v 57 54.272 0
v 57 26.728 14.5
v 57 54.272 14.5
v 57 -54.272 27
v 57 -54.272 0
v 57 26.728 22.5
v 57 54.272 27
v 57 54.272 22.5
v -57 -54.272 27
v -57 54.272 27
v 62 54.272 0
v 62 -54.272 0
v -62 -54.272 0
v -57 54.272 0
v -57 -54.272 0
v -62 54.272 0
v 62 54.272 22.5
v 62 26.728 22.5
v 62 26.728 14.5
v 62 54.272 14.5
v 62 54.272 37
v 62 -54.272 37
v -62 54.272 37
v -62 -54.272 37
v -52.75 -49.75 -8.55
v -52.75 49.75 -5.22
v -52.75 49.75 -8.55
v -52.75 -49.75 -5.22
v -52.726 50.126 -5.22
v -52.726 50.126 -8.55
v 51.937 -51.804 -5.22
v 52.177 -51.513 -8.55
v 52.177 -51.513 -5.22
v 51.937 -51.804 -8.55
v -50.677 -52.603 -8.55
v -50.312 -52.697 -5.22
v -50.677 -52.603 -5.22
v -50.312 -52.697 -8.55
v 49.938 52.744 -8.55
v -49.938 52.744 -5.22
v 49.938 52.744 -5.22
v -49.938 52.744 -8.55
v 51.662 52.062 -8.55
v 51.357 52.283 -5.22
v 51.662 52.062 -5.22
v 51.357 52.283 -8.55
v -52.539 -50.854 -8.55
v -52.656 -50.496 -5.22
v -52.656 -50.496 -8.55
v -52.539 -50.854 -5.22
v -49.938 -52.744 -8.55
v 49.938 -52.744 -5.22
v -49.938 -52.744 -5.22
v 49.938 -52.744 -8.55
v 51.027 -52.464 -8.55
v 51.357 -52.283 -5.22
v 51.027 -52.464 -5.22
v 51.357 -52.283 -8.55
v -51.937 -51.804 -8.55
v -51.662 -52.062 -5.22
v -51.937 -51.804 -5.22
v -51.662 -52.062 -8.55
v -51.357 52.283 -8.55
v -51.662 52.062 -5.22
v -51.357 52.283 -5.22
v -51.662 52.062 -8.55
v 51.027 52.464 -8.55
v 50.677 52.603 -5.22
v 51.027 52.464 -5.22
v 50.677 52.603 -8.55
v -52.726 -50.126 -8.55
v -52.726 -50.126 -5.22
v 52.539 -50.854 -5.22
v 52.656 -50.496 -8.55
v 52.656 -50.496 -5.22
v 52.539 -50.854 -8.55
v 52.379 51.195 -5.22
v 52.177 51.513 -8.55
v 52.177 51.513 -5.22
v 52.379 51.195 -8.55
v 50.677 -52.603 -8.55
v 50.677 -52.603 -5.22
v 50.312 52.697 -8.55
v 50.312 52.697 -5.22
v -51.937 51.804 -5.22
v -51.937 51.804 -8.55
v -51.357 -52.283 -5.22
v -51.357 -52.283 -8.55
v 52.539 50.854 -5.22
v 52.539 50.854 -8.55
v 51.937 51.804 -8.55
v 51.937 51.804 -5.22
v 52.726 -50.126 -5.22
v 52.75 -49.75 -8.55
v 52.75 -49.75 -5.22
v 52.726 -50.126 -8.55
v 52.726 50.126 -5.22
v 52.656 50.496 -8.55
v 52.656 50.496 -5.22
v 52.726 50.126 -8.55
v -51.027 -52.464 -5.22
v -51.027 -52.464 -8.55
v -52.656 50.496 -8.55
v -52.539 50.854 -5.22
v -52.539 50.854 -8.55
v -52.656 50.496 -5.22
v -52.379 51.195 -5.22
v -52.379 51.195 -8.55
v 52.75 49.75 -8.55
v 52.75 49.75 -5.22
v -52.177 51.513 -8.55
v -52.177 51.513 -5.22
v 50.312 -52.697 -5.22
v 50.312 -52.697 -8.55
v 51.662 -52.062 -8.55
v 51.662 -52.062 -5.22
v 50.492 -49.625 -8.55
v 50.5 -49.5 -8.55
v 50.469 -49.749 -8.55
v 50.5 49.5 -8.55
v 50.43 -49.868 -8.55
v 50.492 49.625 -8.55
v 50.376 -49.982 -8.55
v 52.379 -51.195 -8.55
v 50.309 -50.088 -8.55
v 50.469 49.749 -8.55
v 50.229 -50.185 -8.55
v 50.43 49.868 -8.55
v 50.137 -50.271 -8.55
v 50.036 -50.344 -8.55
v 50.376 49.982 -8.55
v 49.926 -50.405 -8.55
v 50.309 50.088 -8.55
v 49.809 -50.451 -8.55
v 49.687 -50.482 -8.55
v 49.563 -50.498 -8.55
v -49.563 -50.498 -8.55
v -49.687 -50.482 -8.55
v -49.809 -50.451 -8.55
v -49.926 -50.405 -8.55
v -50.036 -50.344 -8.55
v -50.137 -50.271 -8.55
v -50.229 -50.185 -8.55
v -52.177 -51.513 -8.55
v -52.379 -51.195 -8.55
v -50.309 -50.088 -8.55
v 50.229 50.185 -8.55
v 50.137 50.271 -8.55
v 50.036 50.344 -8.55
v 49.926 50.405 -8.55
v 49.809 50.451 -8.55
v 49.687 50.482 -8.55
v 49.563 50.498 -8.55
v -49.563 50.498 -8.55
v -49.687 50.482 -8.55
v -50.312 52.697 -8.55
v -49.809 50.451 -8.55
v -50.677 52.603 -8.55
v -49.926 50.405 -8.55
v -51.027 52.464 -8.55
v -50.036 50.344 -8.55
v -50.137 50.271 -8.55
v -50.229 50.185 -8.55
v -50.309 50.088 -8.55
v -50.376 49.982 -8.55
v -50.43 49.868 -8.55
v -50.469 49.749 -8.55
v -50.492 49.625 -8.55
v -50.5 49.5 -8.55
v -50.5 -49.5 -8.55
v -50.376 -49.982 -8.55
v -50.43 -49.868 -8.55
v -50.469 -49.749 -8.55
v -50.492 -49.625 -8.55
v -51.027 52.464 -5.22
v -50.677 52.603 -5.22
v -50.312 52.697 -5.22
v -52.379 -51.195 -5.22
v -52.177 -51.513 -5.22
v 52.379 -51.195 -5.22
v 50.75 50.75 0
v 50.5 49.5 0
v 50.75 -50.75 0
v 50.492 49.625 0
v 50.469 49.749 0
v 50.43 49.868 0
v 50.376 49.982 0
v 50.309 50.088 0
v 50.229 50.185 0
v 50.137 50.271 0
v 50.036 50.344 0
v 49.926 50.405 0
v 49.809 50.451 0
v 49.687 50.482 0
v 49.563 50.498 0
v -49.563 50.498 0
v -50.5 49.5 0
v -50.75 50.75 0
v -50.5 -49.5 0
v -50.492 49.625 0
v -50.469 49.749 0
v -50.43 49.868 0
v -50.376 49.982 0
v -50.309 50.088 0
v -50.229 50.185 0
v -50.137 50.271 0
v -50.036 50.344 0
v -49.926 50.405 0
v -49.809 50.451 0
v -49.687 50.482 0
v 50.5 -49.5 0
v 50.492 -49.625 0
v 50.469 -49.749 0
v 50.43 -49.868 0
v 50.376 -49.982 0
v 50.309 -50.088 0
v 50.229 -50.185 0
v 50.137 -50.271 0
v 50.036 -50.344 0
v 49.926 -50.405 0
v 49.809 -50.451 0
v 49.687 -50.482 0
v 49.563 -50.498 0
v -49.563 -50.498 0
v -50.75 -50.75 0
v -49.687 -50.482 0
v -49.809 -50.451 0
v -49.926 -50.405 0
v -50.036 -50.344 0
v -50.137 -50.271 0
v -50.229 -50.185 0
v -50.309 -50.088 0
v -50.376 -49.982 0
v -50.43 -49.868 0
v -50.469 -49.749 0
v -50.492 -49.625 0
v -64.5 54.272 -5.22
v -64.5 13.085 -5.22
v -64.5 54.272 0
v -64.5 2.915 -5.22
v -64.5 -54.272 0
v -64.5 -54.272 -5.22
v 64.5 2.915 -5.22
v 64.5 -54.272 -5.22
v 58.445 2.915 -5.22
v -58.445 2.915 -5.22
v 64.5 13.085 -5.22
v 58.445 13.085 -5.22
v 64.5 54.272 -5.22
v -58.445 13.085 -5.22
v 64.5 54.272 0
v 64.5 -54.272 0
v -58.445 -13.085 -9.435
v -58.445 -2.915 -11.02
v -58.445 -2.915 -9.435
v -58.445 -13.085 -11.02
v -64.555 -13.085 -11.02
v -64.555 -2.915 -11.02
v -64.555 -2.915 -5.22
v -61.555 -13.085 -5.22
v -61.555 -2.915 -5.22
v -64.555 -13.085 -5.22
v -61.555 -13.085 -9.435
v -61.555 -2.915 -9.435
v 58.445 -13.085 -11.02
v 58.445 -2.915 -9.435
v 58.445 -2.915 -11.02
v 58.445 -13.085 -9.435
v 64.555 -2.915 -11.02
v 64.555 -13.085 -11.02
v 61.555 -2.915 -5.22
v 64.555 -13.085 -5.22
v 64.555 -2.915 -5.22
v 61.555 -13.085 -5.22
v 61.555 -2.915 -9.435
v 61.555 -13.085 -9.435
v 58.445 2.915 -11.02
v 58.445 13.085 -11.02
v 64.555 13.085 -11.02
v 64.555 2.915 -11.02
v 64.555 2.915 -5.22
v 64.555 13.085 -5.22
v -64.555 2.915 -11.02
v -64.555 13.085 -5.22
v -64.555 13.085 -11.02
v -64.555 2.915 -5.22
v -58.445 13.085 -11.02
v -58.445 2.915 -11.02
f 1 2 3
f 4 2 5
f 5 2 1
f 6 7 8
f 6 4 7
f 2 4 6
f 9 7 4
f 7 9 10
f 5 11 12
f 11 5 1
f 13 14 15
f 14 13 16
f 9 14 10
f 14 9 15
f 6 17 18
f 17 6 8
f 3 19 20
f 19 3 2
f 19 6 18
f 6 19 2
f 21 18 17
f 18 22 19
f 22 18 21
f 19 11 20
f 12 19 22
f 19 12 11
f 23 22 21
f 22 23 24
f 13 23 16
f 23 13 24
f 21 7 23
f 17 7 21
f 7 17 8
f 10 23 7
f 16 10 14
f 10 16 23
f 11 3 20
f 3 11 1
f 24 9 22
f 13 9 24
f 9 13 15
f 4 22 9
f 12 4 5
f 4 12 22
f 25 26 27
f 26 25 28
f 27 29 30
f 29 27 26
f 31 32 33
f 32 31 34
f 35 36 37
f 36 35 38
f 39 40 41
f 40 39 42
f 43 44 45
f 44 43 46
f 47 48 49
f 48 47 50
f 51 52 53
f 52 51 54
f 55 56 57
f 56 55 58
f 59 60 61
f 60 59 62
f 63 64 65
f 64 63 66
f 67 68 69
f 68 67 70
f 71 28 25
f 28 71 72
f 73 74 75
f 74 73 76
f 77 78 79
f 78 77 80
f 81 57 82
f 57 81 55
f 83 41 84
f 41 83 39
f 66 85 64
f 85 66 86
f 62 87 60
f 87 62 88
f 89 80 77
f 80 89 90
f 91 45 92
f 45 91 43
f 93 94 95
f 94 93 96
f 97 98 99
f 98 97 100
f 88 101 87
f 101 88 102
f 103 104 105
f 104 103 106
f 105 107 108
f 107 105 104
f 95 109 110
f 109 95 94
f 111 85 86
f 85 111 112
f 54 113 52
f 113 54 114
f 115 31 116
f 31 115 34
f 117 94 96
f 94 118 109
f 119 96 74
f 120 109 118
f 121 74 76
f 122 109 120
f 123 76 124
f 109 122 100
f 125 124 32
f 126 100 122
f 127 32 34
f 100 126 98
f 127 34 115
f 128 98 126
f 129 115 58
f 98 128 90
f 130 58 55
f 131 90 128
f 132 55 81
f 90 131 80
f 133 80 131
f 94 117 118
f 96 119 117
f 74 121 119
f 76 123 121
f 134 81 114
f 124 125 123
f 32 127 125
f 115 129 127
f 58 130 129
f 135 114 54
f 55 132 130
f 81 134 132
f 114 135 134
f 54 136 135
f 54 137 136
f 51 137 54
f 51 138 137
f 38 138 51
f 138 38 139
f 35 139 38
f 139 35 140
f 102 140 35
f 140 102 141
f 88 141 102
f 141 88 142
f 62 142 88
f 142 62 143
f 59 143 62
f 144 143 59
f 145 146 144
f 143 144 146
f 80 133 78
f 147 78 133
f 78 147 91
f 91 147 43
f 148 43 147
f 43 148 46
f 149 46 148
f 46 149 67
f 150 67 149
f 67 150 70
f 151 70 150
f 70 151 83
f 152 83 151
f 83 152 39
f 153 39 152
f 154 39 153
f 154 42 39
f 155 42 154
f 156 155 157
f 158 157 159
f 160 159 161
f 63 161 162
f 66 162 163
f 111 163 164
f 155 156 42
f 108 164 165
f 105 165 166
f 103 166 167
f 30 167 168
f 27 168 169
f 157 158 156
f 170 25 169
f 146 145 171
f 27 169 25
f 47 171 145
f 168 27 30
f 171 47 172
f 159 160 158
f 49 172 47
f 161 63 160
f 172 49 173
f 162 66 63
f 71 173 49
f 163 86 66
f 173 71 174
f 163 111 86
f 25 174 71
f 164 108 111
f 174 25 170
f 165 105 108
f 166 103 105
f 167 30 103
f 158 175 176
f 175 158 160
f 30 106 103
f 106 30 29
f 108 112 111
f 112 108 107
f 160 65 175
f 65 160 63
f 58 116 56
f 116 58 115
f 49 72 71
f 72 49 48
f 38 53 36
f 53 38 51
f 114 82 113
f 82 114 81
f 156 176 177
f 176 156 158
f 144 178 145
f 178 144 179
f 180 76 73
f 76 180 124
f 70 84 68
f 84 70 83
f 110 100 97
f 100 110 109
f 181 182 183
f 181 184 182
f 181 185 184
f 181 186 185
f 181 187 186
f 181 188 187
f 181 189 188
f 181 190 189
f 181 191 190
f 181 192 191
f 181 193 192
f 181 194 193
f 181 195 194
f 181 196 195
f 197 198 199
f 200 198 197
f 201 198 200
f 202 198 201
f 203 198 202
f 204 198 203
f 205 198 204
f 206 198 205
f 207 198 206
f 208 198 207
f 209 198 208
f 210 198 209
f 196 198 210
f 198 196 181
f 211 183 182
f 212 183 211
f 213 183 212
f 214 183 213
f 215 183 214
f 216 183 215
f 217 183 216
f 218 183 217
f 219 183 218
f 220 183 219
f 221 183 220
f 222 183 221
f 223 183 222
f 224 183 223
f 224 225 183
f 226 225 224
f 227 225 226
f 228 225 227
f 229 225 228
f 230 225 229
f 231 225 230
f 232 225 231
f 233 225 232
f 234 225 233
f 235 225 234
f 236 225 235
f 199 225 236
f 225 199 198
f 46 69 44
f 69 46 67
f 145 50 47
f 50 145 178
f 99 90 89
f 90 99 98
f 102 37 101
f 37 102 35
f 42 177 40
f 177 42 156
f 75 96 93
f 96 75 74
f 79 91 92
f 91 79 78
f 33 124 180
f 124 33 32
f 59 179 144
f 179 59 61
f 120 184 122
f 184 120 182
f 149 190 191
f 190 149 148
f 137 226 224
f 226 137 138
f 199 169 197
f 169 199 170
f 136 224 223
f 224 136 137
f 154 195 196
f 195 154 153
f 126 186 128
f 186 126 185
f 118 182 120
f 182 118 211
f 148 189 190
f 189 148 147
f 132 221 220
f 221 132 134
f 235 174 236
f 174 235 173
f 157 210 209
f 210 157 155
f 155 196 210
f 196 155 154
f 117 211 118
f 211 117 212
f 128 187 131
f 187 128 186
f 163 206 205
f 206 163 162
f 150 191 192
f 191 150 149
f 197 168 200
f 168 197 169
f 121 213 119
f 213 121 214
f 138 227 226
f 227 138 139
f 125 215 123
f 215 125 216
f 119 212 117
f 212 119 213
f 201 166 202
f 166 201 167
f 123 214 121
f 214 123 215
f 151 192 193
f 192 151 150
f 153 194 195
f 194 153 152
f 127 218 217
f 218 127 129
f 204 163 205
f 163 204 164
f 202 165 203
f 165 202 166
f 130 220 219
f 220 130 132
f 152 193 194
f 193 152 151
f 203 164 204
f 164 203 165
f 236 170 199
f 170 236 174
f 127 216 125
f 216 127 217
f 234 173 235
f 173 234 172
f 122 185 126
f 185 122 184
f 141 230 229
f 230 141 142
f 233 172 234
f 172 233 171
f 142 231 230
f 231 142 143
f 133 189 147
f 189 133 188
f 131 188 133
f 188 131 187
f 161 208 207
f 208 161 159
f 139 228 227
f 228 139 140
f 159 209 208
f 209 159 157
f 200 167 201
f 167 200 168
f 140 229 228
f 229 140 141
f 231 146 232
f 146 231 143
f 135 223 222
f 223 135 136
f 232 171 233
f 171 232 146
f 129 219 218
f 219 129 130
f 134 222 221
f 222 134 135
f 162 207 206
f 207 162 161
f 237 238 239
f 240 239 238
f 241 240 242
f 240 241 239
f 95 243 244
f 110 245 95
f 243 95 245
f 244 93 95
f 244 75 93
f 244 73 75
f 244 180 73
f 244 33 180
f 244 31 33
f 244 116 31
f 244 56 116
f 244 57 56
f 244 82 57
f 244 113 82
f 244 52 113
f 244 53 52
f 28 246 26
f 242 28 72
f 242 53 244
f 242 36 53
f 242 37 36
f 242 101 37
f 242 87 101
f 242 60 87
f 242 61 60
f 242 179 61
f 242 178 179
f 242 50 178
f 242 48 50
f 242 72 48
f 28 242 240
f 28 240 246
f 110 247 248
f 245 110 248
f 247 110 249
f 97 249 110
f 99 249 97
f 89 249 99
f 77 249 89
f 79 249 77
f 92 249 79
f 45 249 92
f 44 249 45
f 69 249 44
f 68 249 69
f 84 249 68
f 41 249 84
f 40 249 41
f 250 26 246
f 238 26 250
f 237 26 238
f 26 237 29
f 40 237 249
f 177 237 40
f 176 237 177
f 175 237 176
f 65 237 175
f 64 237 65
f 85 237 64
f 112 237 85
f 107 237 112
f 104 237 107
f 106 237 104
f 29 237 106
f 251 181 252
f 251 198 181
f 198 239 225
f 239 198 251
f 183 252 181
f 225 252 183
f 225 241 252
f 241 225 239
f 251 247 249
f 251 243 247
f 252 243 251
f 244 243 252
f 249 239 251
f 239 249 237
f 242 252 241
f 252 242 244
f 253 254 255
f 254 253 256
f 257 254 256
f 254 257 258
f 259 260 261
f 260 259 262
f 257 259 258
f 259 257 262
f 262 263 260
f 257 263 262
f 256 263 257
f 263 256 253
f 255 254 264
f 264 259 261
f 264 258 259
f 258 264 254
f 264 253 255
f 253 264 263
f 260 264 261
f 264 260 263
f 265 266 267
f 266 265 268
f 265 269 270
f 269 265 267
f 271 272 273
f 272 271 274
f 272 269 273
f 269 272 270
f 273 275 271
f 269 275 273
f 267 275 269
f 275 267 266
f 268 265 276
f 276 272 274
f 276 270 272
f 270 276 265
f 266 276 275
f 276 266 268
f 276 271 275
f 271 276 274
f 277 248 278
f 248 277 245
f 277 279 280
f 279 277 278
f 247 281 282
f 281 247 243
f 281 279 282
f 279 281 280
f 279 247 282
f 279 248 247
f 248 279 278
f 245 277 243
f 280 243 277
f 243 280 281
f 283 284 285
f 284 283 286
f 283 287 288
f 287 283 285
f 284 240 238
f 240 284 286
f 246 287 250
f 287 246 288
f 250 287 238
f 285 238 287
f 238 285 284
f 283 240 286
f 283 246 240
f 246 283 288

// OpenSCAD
// file: lib/misc.scad
/*

Polaroid 600 / Polaroid 600se Adapter

This work is licensed under a Creative Commons Attribution-NonCommercial-ShareAlike 3.0 Unported License.

https://creativecommons.org/licenses/by-nc-sa/3.0/

-----------------------

Various parts


The nubs are stupid


*/

/* Nub dimensions [-------------------------------------------------------------- */

nub_depth = 34.19;
nub_width = 5.76;
nub_distance_from_seal = 2;
nub_distance_from_edge = 13.95;
nub_height_from_zero = 5.52;
nub_height = nub_height_from_zero - box_height;

/* Nub modules [-------------------------------------------------------------- */

module nub(nub_x, nub_y, nub_z) {
    
    translate([nub_x,nub_y,nub_z]){
        nub = [nub_width,nub_depth,nub_height];
                
        cube(nub,  center=true);
                
    }
}


module nubs() {
    nub_position1 = (outer_box_width/2-nub_width/2 - nub_distance_from_edge);
    nub_position2 = outer_box_depth/2-nub_depth/2;
    
    nub(nub_position1, nub_position2*-1, box_height);
    nub(nub_position1*-1, nub_position2, box_height);
    nub(nub_position1*-1, nub_position2*-1, box_height);
    nub(nub_position1, nub_position2, box_height);
    
}
// file: lib/claws.scad
/*

Polaroid 600 / Polaroid 600se Adapter

This work is licensed under a Creative Commons Attribution-NonCommercial-ShareAlike 3.0 Unported License.

https://creativecommons.org/licenses/by-nc-sa/3.0/

-----------------------

Claws to hook into the camera body. 

There are two claws and two dummy claws that don't hook. 

The claws hook into the body via the locking / unlocking mechanism on the 600se. 





*/


/* Claw dimensions [-------------------------------------------------------------- */

claw_height_from_zero = 11.02;

claw_width = 6.11; // measured at 5.11
claw_depth = 10.17;
claw_height= claw_height_from_zero-box_height;

claw_distance_from_seal = 5.23;
claw_distance_from_side = 41.90;
claw_distance_from_otherside = 56.00;

echo(outer_box_depth/2 - claw_distance_from_side);
echo(outer_box_depth/2 - claw_distance_from_otherside);

claw_y = 8; // I wish i could derive this. but here we are. 
//used to be (outer_box_depth/2 - claw_distance_from_side) + (outer_box_depth/2 - claw_distance_from_otherside);
//echo(claw_y);

claw_leg_width = 3.00;

claw_inside_height_from_zero = 9.45;
claw_inside_height = claw_inside_height_from_zero-box_height;
claw_inside_width= claw_width - claw_leg_width; // remainder is 3





/* Claw modules [-------------------------------------------------------------- */

module claw(x,y,z, orientation) {
    translate([x,y,z]){
        rotate(a=[0,0, orientation]) {
        difference() {
            claw = [claw_width,claw_depth,claw_height];
            cube(claw, center=true);

            color( "red", 1.0 ){
                translate([claw_leg_width/2,0,-.8]){
                    inside_claw = [claw_inside_width, claw_depth+3, claw_inside_height];
                    cube(inside_claw, center=true);
                }
            }
        } 
        }
    }

}

module dumb_claw(x,y,z, orientation) {
    translate([x,y,z]){
            claw = [claw_width,claw_depth,claw_height];
            cube(claw, center=true);
    }

}


module claw_old(x,y,z, orientation) {
    
    translate([x,y,z]){
        rotate(a=[0,0, orientation]) {
            difference() {
                claw_coords = [claw_width,claw_depth,claw_height+z-give ];
                cube(claw_coords, center=true);
                translate([0,-1.5,-.6]){
                    
                    claw = [claw_width,claw_depth-3,claw_height+z-give];
                    cube(claw, center=true);
                    
                }
            }
        }
    }
}


module claws() {
 
    claw_x = outer_box_width/2-11.5;
    //claw_y = 11 ; 
    height = claw_height/2 + box_height;

    claw(claw_x, -claw_y, height, -180);
    
    claw(-claw_x, -claw_y, height, 0);

    dumb_claw(-claw_x, claw_y, height, 0);
    dumb_claw(claw_x, claw_y, height, 0);
}
// file: lib/seal.scad
/*

Polaroid 600 / Polaroid 600se Adapter

This work is licensed under a Creative Commons Attribution-NonCommercial-ShareAlike 3.0 Unported License.

https://creativecommons.org/licenses/by-nc-sa/3.0/

-----------------------

Light seal

Seal to block the light

The light seal fits into the groove on the 600SE to block light once the back is installed. 


*/



/* Seal dimensions [-------------------------------------------------------------- */


seal_outer = 101;
seal_inner = 99.5;
seal_height = 7.55;
seal_wall_width = 2.11;

/* Seal Module [-------------------------------------------------------------- */


module seal() {
    // set it at 0
    translate([0,0,seal_height/2]){
    difference() {
        
        seal_box = [seal_outer,seal_outer,seal_height];
        //cube(seal_box, center=true);
        miniround(seal_box, 3, center=true);
        
       // inside of the seal
        inner_box = [seal_inner,seal_inner,seal_height];
        miniround(inner_box, 1, center=true);
        //cube(inner_box_lip, center=true);
        
    }
    }
}
// file: lib/base.scad
/*

Polaroid 600 / Polaroid 600se Adapter

This work is licensed under a Creative Commons Attribution-NonCommercial-ShareAlike 3.0 Unported License.

https://creativecommons.org/licenses/by-nc-sa/3.0/

-----------------------

Back Base

This is the generic base. I don't know why it is this big. 


*/


/* Base dimensions [-------------------------------------------------------------- */

outer_box_width= 146;
outer_box_depth = 108.545;
box_height = 5.22;

base_small_difference = 17;

/* Base module [-------------------------------------------------------------- */

// Base abstraction
module base_obj(x,y,z,seal_width) {
    // set it at 0
    translate([0,0,z/2]){
        difference() {
            // base
            outer_box = [x,y,z];
            cube(outer_box, center=true);
 
            // cut out the inside
            inner_box = [seal_width,seal_width,z];
            cube(inner_box,  center=true);
         }
     }   
}


//default base
module default_base() {
    base_obj(outer_box_width,outer_box_depth,box_height,seal_inner+2);
}

//default base
module small_base() {
    base_obj(outer_box_width-base_small_difference,outer_box_depth,box_height,seal_inner+2);
}
// file: lib/functions.scad
/*

Polaroid 600 / Polaroid 600se Adapter

This work is licensed under a Creative Commons Attribution-NonCommercial-ShareAlike 3.0 Unported License.

https://creativecommons.org/licenses/by-nc-sa/3.0/

-----------------------

Misc functions



*/


module miniround(size, radius, center=false)
{
	$fn=50;
	x = size[0]-radius/2;
	y = size[1]-radius/2;

	minkowski()
	{
    	cube(size=[x,y,size[2]], center=center);
    	cylinder(r=radius);
    	// Using a sphere is possible, but will kill performance
    	//sphere(r=radius);
	}
}
// main file
/*

Polaroid 600 / Polaroid 600se Adapter

Refactor of first try


This work is licensed under a Creative Commons Attribution-NonCommercial-ShareAlike 3.0 Unported License.

https://creativecommons.org/licenses/by-nc-sa/3.0/

Todo:
1) Test test test


*/

include <lib/functions.scad>
  
include <lib/base.scad> // Back base
include <lib/seal.scad> // Light seal
include <lib/claws.scad>  // Claws
include <lib/misc.scad> // misc parts


module adapter() {
rotate([0,180,0]) {
    union() {
        color( "green", 1.0 ){
            seal();
        }
        color( "blue", 1.0 ){
            small_base();
        }
        claws();
        
    }
    }
}


cb70_padding = 2;
cb70_width = 112+cb70_padding;
cb70_depth = 154+cb70_padding;
cb70_height = 25+cb70_padding;

module cb70_body() {
    cube ([cb70_width, cb70_depth, cb70_height], center=true);
}    



cb70_notch_height = 8;
cb70_notch_depth = 54;
cb70_notch_width = 13; // at widest point

module cb70_notch() {
    
    x = cb70_width/2+cb70_notch_width/2;
    y = cb70_notch_depth-24;
    z = 5;
    
    translate([x,y,z]){
        cube ([cb70_notch_width, cb70_notch_depth, cb70_notch_height], center=true);
    }
    
}


module cb70() {
    x = 0;
    y = (cb70_depth/2-outer_box_depth/2);
    z = cb70_height/2; // reset to zero
    translate([x,y,z]){
        union() {
        
            cb70_body();
     
            cb70_notch();
  
        }
    }
}

/* holster */

holster_wall_width = 10;
holster_width = cb70_width + holster_wall_width;
holster_depth = outer_box_depth;
holster_height = cb70_height + holster_wall_width;

module holster() {
    x = 0;
    y = (outer_box_depth/2-outer_box_depth/2);
    z = holster_height/2; // reset to zero
    
    translate([x,y,z]){
        cube ([holster_width, holster_depth, holster_height], center=true);
    }
}





union () {

    difference(){
        
        holster();
        cb70(); 
    }
    adapter();

}

//debug_corner();
